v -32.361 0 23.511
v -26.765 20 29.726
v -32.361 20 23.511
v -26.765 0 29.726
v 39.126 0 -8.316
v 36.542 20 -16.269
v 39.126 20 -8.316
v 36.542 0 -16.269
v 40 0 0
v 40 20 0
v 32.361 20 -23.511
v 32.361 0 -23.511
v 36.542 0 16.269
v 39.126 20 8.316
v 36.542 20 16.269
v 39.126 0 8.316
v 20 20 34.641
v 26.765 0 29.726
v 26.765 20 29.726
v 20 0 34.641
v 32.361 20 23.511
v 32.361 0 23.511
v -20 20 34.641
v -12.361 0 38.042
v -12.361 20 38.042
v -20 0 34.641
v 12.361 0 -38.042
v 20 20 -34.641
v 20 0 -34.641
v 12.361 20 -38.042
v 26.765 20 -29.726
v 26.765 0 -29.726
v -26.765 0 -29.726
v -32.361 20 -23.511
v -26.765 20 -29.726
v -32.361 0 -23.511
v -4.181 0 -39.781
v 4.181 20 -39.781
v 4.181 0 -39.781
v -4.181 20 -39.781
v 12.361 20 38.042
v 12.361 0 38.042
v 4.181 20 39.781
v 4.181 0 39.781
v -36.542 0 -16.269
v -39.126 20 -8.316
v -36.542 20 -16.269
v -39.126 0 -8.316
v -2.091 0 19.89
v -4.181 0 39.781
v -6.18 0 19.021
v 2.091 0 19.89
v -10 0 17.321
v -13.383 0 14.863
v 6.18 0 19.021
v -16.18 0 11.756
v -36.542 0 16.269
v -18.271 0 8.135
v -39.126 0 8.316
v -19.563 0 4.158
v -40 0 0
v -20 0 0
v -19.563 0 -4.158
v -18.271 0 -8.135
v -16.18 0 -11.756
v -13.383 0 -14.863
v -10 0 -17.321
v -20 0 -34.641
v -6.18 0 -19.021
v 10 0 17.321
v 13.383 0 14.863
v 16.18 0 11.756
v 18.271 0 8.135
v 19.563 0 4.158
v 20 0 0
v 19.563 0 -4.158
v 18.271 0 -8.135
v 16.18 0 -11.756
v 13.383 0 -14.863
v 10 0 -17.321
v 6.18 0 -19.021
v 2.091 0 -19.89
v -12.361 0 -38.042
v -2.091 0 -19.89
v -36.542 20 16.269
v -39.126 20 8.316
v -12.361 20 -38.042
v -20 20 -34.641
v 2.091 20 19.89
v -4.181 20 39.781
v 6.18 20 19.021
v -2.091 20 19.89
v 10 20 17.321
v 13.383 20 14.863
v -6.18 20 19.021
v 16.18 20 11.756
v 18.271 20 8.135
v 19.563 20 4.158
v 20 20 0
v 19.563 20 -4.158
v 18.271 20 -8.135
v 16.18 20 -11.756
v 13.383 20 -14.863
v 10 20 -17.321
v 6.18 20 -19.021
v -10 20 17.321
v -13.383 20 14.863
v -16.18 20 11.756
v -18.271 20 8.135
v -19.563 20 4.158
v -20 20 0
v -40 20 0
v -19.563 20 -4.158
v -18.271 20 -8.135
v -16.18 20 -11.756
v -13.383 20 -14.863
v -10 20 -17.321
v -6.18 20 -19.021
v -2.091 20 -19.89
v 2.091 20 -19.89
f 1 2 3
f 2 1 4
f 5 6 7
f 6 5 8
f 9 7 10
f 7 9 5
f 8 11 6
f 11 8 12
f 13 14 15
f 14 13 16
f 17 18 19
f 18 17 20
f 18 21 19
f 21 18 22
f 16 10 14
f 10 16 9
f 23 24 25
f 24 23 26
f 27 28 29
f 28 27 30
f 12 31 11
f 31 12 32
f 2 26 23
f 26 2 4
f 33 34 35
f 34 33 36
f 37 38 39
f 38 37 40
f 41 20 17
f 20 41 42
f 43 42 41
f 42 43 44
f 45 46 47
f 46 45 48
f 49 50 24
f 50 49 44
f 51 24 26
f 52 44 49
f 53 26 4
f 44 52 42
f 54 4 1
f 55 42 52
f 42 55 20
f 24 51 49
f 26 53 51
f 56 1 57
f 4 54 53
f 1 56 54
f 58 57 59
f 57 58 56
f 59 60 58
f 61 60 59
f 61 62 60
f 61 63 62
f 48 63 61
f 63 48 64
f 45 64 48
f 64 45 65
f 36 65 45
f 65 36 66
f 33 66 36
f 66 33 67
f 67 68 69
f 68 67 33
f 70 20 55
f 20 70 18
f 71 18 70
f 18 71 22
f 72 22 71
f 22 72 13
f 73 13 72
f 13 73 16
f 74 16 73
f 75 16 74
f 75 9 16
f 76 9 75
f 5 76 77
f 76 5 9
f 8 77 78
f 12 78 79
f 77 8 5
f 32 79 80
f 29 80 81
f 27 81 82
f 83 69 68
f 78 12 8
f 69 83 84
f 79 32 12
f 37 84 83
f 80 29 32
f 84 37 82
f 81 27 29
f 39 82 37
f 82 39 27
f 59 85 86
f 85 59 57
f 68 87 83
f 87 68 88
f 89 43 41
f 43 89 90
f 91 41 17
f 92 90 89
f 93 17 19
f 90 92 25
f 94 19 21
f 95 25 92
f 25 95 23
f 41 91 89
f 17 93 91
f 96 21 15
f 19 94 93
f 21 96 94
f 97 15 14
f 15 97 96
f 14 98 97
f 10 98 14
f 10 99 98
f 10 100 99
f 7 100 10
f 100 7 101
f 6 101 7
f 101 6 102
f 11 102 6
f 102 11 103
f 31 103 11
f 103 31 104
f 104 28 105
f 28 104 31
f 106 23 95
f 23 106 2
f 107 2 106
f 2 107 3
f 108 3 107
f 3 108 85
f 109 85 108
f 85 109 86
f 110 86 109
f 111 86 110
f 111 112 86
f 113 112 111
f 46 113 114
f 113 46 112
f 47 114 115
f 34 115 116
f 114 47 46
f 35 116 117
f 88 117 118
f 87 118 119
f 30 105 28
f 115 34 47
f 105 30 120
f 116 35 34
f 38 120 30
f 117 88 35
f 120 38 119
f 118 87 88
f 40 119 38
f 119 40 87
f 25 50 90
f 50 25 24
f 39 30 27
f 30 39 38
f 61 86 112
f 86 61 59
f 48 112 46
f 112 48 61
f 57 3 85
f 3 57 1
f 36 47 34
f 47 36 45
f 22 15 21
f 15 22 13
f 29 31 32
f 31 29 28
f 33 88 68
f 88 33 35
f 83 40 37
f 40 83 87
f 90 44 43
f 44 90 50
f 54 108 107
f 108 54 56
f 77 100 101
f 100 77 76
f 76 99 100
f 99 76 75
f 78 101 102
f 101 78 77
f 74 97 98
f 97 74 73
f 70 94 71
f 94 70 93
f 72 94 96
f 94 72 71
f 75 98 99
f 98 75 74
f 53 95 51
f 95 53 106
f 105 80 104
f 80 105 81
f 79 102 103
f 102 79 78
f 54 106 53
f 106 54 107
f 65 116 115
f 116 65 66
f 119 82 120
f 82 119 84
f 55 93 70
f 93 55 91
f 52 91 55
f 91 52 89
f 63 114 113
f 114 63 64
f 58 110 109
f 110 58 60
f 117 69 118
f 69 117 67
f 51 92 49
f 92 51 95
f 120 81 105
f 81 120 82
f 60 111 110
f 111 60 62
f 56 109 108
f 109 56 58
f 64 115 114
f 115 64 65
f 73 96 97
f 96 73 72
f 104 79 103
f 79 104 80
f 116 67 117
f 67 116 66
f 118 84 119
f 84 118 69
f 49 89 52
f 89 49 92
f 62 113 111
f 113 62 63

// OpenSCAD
rotate([-90, 0, 0]) {
	difference() {
		cylinder(r=40, h=20);
		translate([0, 0, -1]) {
			cylinder(r=20, h=22);
		}
	}
}
